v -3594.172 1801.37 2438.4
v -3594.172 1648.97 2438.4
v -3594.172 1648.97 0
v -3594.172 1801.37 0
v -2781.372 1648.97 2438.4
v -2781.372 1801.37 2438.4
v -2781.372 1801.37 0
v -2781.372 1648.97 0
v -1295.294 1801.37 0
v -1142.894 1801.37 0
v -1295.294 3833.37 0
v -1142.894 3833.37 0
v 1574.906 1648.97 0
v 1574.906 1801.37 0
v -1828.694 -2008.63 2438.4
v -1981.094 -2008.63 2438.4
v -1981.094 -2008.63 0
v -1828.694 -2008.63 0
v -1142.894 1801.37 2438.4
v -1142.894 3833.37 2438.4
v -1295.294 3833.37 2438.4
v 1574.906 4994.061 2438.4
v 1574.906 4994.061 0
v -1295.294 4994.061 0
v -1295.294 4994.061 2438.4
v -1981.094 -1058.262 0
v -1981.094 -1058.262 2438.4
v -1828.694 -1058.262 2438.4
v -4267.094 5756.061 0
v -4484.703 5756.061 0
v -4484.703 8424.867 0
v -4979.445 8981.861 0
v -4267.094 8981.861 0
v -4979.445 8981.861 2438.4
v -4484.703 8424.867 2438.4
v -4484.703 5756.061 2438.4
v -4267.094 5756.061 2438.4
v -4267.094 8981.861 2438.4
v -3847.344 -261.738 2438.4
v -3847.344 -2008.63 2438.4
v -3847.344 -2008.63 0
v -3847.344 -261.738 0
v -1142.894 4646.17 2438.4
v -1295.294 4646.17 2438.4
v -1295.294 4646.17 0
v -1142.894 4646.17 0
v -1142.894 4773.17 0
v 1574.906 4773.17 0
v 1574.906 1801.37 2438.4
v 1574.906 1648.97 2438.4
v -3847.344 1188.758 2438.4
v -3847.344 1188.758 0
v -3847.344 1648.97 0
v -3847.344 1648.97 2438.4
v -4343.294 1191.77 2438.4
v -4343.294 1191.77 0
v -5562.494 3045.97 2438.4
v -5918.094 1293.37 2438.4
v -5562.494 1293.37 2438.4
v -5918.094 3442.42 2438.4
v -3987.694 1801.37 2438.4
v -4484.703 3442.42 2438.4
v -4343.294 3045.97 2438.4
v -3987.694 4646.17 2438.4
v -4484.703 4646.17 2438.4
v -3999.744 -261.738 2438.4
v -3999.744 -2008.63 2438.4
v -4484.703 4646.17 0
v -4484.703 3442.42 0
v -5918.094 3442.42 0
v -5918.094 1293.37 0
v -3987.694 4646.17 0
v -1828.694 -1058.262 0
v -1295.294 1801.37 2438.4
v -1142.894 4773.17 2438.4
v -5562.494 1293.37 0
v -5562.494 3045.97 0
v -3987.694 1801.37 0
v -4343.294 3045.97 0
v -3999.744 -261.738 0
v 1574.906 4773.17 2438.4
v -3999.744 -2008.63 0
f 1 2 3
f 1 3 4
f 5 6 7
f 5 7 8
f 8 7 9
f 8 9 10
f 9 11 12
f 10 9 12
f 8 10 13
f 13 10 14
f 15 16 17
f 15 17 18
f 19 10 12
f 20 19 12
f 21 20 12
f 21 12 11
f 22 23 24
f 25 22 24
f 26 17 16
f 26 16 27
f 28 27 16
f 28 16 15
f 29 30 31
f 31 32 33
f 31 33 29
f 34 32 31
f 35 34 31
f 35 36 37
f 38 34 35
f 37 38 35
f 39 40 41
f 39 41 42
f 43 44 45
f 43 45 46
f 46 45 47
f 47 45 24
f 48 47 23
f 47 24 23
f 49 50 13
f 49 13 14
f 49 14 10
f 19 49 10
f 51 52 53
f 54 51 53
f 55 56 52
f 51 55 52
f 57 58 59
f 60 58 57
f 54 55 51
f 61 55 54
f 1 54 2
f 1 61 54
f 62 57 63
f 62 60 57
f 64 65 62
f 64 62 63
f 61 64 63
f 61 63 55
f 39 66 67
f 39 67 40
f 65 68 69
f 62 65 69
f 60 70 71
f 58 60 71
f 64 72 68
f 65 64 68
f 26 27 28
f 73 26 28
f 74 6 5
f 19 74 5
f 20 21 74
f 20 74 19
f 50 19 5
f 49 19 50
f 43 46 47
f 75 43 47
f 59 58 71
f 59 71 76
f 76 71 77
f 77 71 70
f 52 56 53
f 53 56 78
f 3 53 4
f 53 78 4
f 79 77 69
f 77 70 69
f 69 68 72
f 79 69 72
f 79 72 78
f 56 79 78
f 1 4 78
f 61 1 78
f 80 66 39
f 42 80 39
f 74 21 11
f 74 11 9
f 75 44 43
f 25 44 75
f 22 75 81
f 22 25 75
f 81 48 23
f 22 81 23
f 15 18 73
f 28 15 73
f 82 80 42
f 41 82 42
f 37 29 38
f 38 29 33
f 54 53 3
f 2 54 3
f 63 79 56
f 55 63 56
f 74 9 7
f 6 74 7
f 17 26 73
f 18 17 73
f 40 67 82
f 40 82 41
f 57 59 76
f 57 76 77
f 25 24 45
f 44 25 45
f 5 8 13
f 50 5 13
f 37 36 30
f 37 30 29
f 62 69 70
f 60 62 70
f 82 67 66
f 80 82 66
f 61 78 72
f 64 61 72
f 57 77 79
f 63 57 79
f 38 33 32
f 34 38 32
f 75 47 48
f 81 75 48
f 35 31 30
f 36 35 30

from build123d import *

# Parameters (mm, degrees)
F1_DEPTH = 2438.4
F0_W     = 152.4
F0_H     = 950.3680467606
F0_H_2   = 1746.8922138214


# Not quite as in the source:
# - the program builds the solid bodies; features that only make, move or delete a surface that nothing else refers to are left out


with BuildPart() as f1:
    # F0 (on Top) → F1 (new body)
    with BuildSketch(Plane.XY):
        Polygon((-3847.3440776825, 1188.7577511787), (-3847.3440776825, 1648.9702011108), (-3594.1724777222, 1648.9702011108), (-3594.1724777222, 1801.3702011108), (-3987.6942779541, 1801.3702011108), (-3987.6942779541, 4646.1702011108), (-4484.7030639648, 4646.1702011108), (-4484.7030639648, 3442.4197673798), (-5918.0942779541, 3442.4197673798), (-5918.0942779541, 3045.9702011108), (-5918.0942779541, 1293.3702011108), (-5562.4942779541, 1293.3702011108), (-5562.4942779541, 3045.9702011108), (-4343.2942779541, 3045.9702011108), (-4343.2942779541, 1191.7702011108), align=None)
    extrude(amount=F1_DEPTH)


with BuildPart() as f1b:
    # F0 (on Top) → F1, piece 2 (new body)
    with BuildSketch(Plane.XY):
        Polygon((-4267.0942779541, 5756.060754776), (-4267.0942779541, 8981.860754776), (-4979.4447412196, 8981.860754776), (-4484.7030639648, 8424.8667533997), (-4484.7030639648, 5930.2643890381), (-4484.7030639648, 5756.060754776), align=None)
    extrude(amount=F1_DEPTH)


with BuildPart() as f1c:
    # F0 (on Top) → F1, piece 3 (new body)
    with BuildSketch(Plane.XY):
        Polygon((-1142.8942779541, 4773.1702011108), (1574.9057220459, 4773.1702011108), (1574.9057220459, 4994.060754776), (-1295.2942779541, 4994.060754776), (-1295.2942779541, 4646.1702011108), (-1142.8942779541, 4646.1702011108), align=None)
    extrude(amount=F1_DEPTH)


with BuildPart() as f1d:
    # F0 (on Top) → F1, piece 4 (new body)
    with BuildSketch(Plane.XY):
        Polygon((-2781.3724777222, 1648.9702011108), (1574.9057220459, 1648.9702011108), (1574.9057220459, 1801.3702011108), (-1142.8942779541, 1801.3702011108), (-1142.8942779541, 3833.3702011108), (-1295.2942779541, 3833.3702011108), (-1295.2942779541, 1801.3702011108), (-2781.3724777222, 1801.3702011108), align=None)
    extrude(amount=F1_DEPTH)


with BuildPart() as f1e:
    # F0 (on Top) → F1, piece 5 (new body)
    with BuildSketch(Plane.XY):
        with Locations((-1904.8942779541, -1533.4457755089)):
            Rectangle(F0_W, F0_H)
    extrude(amount=F1_DEPTH)


with BuildPart() as f1f:
    # F0 (on Top) → F1, piece 6 (new body)
    with BuildSketch(Plane.XY):
        with Locations((-3923.5440776825, -1135.1836919785)):
            Rectangle(F0_W, F0_H_2)
    extrude(amount=F1_DEPTH)


solid = Compound([f1.part, f1b.part, f1c.part, f1d.part, f1e.part, f1f.part])
